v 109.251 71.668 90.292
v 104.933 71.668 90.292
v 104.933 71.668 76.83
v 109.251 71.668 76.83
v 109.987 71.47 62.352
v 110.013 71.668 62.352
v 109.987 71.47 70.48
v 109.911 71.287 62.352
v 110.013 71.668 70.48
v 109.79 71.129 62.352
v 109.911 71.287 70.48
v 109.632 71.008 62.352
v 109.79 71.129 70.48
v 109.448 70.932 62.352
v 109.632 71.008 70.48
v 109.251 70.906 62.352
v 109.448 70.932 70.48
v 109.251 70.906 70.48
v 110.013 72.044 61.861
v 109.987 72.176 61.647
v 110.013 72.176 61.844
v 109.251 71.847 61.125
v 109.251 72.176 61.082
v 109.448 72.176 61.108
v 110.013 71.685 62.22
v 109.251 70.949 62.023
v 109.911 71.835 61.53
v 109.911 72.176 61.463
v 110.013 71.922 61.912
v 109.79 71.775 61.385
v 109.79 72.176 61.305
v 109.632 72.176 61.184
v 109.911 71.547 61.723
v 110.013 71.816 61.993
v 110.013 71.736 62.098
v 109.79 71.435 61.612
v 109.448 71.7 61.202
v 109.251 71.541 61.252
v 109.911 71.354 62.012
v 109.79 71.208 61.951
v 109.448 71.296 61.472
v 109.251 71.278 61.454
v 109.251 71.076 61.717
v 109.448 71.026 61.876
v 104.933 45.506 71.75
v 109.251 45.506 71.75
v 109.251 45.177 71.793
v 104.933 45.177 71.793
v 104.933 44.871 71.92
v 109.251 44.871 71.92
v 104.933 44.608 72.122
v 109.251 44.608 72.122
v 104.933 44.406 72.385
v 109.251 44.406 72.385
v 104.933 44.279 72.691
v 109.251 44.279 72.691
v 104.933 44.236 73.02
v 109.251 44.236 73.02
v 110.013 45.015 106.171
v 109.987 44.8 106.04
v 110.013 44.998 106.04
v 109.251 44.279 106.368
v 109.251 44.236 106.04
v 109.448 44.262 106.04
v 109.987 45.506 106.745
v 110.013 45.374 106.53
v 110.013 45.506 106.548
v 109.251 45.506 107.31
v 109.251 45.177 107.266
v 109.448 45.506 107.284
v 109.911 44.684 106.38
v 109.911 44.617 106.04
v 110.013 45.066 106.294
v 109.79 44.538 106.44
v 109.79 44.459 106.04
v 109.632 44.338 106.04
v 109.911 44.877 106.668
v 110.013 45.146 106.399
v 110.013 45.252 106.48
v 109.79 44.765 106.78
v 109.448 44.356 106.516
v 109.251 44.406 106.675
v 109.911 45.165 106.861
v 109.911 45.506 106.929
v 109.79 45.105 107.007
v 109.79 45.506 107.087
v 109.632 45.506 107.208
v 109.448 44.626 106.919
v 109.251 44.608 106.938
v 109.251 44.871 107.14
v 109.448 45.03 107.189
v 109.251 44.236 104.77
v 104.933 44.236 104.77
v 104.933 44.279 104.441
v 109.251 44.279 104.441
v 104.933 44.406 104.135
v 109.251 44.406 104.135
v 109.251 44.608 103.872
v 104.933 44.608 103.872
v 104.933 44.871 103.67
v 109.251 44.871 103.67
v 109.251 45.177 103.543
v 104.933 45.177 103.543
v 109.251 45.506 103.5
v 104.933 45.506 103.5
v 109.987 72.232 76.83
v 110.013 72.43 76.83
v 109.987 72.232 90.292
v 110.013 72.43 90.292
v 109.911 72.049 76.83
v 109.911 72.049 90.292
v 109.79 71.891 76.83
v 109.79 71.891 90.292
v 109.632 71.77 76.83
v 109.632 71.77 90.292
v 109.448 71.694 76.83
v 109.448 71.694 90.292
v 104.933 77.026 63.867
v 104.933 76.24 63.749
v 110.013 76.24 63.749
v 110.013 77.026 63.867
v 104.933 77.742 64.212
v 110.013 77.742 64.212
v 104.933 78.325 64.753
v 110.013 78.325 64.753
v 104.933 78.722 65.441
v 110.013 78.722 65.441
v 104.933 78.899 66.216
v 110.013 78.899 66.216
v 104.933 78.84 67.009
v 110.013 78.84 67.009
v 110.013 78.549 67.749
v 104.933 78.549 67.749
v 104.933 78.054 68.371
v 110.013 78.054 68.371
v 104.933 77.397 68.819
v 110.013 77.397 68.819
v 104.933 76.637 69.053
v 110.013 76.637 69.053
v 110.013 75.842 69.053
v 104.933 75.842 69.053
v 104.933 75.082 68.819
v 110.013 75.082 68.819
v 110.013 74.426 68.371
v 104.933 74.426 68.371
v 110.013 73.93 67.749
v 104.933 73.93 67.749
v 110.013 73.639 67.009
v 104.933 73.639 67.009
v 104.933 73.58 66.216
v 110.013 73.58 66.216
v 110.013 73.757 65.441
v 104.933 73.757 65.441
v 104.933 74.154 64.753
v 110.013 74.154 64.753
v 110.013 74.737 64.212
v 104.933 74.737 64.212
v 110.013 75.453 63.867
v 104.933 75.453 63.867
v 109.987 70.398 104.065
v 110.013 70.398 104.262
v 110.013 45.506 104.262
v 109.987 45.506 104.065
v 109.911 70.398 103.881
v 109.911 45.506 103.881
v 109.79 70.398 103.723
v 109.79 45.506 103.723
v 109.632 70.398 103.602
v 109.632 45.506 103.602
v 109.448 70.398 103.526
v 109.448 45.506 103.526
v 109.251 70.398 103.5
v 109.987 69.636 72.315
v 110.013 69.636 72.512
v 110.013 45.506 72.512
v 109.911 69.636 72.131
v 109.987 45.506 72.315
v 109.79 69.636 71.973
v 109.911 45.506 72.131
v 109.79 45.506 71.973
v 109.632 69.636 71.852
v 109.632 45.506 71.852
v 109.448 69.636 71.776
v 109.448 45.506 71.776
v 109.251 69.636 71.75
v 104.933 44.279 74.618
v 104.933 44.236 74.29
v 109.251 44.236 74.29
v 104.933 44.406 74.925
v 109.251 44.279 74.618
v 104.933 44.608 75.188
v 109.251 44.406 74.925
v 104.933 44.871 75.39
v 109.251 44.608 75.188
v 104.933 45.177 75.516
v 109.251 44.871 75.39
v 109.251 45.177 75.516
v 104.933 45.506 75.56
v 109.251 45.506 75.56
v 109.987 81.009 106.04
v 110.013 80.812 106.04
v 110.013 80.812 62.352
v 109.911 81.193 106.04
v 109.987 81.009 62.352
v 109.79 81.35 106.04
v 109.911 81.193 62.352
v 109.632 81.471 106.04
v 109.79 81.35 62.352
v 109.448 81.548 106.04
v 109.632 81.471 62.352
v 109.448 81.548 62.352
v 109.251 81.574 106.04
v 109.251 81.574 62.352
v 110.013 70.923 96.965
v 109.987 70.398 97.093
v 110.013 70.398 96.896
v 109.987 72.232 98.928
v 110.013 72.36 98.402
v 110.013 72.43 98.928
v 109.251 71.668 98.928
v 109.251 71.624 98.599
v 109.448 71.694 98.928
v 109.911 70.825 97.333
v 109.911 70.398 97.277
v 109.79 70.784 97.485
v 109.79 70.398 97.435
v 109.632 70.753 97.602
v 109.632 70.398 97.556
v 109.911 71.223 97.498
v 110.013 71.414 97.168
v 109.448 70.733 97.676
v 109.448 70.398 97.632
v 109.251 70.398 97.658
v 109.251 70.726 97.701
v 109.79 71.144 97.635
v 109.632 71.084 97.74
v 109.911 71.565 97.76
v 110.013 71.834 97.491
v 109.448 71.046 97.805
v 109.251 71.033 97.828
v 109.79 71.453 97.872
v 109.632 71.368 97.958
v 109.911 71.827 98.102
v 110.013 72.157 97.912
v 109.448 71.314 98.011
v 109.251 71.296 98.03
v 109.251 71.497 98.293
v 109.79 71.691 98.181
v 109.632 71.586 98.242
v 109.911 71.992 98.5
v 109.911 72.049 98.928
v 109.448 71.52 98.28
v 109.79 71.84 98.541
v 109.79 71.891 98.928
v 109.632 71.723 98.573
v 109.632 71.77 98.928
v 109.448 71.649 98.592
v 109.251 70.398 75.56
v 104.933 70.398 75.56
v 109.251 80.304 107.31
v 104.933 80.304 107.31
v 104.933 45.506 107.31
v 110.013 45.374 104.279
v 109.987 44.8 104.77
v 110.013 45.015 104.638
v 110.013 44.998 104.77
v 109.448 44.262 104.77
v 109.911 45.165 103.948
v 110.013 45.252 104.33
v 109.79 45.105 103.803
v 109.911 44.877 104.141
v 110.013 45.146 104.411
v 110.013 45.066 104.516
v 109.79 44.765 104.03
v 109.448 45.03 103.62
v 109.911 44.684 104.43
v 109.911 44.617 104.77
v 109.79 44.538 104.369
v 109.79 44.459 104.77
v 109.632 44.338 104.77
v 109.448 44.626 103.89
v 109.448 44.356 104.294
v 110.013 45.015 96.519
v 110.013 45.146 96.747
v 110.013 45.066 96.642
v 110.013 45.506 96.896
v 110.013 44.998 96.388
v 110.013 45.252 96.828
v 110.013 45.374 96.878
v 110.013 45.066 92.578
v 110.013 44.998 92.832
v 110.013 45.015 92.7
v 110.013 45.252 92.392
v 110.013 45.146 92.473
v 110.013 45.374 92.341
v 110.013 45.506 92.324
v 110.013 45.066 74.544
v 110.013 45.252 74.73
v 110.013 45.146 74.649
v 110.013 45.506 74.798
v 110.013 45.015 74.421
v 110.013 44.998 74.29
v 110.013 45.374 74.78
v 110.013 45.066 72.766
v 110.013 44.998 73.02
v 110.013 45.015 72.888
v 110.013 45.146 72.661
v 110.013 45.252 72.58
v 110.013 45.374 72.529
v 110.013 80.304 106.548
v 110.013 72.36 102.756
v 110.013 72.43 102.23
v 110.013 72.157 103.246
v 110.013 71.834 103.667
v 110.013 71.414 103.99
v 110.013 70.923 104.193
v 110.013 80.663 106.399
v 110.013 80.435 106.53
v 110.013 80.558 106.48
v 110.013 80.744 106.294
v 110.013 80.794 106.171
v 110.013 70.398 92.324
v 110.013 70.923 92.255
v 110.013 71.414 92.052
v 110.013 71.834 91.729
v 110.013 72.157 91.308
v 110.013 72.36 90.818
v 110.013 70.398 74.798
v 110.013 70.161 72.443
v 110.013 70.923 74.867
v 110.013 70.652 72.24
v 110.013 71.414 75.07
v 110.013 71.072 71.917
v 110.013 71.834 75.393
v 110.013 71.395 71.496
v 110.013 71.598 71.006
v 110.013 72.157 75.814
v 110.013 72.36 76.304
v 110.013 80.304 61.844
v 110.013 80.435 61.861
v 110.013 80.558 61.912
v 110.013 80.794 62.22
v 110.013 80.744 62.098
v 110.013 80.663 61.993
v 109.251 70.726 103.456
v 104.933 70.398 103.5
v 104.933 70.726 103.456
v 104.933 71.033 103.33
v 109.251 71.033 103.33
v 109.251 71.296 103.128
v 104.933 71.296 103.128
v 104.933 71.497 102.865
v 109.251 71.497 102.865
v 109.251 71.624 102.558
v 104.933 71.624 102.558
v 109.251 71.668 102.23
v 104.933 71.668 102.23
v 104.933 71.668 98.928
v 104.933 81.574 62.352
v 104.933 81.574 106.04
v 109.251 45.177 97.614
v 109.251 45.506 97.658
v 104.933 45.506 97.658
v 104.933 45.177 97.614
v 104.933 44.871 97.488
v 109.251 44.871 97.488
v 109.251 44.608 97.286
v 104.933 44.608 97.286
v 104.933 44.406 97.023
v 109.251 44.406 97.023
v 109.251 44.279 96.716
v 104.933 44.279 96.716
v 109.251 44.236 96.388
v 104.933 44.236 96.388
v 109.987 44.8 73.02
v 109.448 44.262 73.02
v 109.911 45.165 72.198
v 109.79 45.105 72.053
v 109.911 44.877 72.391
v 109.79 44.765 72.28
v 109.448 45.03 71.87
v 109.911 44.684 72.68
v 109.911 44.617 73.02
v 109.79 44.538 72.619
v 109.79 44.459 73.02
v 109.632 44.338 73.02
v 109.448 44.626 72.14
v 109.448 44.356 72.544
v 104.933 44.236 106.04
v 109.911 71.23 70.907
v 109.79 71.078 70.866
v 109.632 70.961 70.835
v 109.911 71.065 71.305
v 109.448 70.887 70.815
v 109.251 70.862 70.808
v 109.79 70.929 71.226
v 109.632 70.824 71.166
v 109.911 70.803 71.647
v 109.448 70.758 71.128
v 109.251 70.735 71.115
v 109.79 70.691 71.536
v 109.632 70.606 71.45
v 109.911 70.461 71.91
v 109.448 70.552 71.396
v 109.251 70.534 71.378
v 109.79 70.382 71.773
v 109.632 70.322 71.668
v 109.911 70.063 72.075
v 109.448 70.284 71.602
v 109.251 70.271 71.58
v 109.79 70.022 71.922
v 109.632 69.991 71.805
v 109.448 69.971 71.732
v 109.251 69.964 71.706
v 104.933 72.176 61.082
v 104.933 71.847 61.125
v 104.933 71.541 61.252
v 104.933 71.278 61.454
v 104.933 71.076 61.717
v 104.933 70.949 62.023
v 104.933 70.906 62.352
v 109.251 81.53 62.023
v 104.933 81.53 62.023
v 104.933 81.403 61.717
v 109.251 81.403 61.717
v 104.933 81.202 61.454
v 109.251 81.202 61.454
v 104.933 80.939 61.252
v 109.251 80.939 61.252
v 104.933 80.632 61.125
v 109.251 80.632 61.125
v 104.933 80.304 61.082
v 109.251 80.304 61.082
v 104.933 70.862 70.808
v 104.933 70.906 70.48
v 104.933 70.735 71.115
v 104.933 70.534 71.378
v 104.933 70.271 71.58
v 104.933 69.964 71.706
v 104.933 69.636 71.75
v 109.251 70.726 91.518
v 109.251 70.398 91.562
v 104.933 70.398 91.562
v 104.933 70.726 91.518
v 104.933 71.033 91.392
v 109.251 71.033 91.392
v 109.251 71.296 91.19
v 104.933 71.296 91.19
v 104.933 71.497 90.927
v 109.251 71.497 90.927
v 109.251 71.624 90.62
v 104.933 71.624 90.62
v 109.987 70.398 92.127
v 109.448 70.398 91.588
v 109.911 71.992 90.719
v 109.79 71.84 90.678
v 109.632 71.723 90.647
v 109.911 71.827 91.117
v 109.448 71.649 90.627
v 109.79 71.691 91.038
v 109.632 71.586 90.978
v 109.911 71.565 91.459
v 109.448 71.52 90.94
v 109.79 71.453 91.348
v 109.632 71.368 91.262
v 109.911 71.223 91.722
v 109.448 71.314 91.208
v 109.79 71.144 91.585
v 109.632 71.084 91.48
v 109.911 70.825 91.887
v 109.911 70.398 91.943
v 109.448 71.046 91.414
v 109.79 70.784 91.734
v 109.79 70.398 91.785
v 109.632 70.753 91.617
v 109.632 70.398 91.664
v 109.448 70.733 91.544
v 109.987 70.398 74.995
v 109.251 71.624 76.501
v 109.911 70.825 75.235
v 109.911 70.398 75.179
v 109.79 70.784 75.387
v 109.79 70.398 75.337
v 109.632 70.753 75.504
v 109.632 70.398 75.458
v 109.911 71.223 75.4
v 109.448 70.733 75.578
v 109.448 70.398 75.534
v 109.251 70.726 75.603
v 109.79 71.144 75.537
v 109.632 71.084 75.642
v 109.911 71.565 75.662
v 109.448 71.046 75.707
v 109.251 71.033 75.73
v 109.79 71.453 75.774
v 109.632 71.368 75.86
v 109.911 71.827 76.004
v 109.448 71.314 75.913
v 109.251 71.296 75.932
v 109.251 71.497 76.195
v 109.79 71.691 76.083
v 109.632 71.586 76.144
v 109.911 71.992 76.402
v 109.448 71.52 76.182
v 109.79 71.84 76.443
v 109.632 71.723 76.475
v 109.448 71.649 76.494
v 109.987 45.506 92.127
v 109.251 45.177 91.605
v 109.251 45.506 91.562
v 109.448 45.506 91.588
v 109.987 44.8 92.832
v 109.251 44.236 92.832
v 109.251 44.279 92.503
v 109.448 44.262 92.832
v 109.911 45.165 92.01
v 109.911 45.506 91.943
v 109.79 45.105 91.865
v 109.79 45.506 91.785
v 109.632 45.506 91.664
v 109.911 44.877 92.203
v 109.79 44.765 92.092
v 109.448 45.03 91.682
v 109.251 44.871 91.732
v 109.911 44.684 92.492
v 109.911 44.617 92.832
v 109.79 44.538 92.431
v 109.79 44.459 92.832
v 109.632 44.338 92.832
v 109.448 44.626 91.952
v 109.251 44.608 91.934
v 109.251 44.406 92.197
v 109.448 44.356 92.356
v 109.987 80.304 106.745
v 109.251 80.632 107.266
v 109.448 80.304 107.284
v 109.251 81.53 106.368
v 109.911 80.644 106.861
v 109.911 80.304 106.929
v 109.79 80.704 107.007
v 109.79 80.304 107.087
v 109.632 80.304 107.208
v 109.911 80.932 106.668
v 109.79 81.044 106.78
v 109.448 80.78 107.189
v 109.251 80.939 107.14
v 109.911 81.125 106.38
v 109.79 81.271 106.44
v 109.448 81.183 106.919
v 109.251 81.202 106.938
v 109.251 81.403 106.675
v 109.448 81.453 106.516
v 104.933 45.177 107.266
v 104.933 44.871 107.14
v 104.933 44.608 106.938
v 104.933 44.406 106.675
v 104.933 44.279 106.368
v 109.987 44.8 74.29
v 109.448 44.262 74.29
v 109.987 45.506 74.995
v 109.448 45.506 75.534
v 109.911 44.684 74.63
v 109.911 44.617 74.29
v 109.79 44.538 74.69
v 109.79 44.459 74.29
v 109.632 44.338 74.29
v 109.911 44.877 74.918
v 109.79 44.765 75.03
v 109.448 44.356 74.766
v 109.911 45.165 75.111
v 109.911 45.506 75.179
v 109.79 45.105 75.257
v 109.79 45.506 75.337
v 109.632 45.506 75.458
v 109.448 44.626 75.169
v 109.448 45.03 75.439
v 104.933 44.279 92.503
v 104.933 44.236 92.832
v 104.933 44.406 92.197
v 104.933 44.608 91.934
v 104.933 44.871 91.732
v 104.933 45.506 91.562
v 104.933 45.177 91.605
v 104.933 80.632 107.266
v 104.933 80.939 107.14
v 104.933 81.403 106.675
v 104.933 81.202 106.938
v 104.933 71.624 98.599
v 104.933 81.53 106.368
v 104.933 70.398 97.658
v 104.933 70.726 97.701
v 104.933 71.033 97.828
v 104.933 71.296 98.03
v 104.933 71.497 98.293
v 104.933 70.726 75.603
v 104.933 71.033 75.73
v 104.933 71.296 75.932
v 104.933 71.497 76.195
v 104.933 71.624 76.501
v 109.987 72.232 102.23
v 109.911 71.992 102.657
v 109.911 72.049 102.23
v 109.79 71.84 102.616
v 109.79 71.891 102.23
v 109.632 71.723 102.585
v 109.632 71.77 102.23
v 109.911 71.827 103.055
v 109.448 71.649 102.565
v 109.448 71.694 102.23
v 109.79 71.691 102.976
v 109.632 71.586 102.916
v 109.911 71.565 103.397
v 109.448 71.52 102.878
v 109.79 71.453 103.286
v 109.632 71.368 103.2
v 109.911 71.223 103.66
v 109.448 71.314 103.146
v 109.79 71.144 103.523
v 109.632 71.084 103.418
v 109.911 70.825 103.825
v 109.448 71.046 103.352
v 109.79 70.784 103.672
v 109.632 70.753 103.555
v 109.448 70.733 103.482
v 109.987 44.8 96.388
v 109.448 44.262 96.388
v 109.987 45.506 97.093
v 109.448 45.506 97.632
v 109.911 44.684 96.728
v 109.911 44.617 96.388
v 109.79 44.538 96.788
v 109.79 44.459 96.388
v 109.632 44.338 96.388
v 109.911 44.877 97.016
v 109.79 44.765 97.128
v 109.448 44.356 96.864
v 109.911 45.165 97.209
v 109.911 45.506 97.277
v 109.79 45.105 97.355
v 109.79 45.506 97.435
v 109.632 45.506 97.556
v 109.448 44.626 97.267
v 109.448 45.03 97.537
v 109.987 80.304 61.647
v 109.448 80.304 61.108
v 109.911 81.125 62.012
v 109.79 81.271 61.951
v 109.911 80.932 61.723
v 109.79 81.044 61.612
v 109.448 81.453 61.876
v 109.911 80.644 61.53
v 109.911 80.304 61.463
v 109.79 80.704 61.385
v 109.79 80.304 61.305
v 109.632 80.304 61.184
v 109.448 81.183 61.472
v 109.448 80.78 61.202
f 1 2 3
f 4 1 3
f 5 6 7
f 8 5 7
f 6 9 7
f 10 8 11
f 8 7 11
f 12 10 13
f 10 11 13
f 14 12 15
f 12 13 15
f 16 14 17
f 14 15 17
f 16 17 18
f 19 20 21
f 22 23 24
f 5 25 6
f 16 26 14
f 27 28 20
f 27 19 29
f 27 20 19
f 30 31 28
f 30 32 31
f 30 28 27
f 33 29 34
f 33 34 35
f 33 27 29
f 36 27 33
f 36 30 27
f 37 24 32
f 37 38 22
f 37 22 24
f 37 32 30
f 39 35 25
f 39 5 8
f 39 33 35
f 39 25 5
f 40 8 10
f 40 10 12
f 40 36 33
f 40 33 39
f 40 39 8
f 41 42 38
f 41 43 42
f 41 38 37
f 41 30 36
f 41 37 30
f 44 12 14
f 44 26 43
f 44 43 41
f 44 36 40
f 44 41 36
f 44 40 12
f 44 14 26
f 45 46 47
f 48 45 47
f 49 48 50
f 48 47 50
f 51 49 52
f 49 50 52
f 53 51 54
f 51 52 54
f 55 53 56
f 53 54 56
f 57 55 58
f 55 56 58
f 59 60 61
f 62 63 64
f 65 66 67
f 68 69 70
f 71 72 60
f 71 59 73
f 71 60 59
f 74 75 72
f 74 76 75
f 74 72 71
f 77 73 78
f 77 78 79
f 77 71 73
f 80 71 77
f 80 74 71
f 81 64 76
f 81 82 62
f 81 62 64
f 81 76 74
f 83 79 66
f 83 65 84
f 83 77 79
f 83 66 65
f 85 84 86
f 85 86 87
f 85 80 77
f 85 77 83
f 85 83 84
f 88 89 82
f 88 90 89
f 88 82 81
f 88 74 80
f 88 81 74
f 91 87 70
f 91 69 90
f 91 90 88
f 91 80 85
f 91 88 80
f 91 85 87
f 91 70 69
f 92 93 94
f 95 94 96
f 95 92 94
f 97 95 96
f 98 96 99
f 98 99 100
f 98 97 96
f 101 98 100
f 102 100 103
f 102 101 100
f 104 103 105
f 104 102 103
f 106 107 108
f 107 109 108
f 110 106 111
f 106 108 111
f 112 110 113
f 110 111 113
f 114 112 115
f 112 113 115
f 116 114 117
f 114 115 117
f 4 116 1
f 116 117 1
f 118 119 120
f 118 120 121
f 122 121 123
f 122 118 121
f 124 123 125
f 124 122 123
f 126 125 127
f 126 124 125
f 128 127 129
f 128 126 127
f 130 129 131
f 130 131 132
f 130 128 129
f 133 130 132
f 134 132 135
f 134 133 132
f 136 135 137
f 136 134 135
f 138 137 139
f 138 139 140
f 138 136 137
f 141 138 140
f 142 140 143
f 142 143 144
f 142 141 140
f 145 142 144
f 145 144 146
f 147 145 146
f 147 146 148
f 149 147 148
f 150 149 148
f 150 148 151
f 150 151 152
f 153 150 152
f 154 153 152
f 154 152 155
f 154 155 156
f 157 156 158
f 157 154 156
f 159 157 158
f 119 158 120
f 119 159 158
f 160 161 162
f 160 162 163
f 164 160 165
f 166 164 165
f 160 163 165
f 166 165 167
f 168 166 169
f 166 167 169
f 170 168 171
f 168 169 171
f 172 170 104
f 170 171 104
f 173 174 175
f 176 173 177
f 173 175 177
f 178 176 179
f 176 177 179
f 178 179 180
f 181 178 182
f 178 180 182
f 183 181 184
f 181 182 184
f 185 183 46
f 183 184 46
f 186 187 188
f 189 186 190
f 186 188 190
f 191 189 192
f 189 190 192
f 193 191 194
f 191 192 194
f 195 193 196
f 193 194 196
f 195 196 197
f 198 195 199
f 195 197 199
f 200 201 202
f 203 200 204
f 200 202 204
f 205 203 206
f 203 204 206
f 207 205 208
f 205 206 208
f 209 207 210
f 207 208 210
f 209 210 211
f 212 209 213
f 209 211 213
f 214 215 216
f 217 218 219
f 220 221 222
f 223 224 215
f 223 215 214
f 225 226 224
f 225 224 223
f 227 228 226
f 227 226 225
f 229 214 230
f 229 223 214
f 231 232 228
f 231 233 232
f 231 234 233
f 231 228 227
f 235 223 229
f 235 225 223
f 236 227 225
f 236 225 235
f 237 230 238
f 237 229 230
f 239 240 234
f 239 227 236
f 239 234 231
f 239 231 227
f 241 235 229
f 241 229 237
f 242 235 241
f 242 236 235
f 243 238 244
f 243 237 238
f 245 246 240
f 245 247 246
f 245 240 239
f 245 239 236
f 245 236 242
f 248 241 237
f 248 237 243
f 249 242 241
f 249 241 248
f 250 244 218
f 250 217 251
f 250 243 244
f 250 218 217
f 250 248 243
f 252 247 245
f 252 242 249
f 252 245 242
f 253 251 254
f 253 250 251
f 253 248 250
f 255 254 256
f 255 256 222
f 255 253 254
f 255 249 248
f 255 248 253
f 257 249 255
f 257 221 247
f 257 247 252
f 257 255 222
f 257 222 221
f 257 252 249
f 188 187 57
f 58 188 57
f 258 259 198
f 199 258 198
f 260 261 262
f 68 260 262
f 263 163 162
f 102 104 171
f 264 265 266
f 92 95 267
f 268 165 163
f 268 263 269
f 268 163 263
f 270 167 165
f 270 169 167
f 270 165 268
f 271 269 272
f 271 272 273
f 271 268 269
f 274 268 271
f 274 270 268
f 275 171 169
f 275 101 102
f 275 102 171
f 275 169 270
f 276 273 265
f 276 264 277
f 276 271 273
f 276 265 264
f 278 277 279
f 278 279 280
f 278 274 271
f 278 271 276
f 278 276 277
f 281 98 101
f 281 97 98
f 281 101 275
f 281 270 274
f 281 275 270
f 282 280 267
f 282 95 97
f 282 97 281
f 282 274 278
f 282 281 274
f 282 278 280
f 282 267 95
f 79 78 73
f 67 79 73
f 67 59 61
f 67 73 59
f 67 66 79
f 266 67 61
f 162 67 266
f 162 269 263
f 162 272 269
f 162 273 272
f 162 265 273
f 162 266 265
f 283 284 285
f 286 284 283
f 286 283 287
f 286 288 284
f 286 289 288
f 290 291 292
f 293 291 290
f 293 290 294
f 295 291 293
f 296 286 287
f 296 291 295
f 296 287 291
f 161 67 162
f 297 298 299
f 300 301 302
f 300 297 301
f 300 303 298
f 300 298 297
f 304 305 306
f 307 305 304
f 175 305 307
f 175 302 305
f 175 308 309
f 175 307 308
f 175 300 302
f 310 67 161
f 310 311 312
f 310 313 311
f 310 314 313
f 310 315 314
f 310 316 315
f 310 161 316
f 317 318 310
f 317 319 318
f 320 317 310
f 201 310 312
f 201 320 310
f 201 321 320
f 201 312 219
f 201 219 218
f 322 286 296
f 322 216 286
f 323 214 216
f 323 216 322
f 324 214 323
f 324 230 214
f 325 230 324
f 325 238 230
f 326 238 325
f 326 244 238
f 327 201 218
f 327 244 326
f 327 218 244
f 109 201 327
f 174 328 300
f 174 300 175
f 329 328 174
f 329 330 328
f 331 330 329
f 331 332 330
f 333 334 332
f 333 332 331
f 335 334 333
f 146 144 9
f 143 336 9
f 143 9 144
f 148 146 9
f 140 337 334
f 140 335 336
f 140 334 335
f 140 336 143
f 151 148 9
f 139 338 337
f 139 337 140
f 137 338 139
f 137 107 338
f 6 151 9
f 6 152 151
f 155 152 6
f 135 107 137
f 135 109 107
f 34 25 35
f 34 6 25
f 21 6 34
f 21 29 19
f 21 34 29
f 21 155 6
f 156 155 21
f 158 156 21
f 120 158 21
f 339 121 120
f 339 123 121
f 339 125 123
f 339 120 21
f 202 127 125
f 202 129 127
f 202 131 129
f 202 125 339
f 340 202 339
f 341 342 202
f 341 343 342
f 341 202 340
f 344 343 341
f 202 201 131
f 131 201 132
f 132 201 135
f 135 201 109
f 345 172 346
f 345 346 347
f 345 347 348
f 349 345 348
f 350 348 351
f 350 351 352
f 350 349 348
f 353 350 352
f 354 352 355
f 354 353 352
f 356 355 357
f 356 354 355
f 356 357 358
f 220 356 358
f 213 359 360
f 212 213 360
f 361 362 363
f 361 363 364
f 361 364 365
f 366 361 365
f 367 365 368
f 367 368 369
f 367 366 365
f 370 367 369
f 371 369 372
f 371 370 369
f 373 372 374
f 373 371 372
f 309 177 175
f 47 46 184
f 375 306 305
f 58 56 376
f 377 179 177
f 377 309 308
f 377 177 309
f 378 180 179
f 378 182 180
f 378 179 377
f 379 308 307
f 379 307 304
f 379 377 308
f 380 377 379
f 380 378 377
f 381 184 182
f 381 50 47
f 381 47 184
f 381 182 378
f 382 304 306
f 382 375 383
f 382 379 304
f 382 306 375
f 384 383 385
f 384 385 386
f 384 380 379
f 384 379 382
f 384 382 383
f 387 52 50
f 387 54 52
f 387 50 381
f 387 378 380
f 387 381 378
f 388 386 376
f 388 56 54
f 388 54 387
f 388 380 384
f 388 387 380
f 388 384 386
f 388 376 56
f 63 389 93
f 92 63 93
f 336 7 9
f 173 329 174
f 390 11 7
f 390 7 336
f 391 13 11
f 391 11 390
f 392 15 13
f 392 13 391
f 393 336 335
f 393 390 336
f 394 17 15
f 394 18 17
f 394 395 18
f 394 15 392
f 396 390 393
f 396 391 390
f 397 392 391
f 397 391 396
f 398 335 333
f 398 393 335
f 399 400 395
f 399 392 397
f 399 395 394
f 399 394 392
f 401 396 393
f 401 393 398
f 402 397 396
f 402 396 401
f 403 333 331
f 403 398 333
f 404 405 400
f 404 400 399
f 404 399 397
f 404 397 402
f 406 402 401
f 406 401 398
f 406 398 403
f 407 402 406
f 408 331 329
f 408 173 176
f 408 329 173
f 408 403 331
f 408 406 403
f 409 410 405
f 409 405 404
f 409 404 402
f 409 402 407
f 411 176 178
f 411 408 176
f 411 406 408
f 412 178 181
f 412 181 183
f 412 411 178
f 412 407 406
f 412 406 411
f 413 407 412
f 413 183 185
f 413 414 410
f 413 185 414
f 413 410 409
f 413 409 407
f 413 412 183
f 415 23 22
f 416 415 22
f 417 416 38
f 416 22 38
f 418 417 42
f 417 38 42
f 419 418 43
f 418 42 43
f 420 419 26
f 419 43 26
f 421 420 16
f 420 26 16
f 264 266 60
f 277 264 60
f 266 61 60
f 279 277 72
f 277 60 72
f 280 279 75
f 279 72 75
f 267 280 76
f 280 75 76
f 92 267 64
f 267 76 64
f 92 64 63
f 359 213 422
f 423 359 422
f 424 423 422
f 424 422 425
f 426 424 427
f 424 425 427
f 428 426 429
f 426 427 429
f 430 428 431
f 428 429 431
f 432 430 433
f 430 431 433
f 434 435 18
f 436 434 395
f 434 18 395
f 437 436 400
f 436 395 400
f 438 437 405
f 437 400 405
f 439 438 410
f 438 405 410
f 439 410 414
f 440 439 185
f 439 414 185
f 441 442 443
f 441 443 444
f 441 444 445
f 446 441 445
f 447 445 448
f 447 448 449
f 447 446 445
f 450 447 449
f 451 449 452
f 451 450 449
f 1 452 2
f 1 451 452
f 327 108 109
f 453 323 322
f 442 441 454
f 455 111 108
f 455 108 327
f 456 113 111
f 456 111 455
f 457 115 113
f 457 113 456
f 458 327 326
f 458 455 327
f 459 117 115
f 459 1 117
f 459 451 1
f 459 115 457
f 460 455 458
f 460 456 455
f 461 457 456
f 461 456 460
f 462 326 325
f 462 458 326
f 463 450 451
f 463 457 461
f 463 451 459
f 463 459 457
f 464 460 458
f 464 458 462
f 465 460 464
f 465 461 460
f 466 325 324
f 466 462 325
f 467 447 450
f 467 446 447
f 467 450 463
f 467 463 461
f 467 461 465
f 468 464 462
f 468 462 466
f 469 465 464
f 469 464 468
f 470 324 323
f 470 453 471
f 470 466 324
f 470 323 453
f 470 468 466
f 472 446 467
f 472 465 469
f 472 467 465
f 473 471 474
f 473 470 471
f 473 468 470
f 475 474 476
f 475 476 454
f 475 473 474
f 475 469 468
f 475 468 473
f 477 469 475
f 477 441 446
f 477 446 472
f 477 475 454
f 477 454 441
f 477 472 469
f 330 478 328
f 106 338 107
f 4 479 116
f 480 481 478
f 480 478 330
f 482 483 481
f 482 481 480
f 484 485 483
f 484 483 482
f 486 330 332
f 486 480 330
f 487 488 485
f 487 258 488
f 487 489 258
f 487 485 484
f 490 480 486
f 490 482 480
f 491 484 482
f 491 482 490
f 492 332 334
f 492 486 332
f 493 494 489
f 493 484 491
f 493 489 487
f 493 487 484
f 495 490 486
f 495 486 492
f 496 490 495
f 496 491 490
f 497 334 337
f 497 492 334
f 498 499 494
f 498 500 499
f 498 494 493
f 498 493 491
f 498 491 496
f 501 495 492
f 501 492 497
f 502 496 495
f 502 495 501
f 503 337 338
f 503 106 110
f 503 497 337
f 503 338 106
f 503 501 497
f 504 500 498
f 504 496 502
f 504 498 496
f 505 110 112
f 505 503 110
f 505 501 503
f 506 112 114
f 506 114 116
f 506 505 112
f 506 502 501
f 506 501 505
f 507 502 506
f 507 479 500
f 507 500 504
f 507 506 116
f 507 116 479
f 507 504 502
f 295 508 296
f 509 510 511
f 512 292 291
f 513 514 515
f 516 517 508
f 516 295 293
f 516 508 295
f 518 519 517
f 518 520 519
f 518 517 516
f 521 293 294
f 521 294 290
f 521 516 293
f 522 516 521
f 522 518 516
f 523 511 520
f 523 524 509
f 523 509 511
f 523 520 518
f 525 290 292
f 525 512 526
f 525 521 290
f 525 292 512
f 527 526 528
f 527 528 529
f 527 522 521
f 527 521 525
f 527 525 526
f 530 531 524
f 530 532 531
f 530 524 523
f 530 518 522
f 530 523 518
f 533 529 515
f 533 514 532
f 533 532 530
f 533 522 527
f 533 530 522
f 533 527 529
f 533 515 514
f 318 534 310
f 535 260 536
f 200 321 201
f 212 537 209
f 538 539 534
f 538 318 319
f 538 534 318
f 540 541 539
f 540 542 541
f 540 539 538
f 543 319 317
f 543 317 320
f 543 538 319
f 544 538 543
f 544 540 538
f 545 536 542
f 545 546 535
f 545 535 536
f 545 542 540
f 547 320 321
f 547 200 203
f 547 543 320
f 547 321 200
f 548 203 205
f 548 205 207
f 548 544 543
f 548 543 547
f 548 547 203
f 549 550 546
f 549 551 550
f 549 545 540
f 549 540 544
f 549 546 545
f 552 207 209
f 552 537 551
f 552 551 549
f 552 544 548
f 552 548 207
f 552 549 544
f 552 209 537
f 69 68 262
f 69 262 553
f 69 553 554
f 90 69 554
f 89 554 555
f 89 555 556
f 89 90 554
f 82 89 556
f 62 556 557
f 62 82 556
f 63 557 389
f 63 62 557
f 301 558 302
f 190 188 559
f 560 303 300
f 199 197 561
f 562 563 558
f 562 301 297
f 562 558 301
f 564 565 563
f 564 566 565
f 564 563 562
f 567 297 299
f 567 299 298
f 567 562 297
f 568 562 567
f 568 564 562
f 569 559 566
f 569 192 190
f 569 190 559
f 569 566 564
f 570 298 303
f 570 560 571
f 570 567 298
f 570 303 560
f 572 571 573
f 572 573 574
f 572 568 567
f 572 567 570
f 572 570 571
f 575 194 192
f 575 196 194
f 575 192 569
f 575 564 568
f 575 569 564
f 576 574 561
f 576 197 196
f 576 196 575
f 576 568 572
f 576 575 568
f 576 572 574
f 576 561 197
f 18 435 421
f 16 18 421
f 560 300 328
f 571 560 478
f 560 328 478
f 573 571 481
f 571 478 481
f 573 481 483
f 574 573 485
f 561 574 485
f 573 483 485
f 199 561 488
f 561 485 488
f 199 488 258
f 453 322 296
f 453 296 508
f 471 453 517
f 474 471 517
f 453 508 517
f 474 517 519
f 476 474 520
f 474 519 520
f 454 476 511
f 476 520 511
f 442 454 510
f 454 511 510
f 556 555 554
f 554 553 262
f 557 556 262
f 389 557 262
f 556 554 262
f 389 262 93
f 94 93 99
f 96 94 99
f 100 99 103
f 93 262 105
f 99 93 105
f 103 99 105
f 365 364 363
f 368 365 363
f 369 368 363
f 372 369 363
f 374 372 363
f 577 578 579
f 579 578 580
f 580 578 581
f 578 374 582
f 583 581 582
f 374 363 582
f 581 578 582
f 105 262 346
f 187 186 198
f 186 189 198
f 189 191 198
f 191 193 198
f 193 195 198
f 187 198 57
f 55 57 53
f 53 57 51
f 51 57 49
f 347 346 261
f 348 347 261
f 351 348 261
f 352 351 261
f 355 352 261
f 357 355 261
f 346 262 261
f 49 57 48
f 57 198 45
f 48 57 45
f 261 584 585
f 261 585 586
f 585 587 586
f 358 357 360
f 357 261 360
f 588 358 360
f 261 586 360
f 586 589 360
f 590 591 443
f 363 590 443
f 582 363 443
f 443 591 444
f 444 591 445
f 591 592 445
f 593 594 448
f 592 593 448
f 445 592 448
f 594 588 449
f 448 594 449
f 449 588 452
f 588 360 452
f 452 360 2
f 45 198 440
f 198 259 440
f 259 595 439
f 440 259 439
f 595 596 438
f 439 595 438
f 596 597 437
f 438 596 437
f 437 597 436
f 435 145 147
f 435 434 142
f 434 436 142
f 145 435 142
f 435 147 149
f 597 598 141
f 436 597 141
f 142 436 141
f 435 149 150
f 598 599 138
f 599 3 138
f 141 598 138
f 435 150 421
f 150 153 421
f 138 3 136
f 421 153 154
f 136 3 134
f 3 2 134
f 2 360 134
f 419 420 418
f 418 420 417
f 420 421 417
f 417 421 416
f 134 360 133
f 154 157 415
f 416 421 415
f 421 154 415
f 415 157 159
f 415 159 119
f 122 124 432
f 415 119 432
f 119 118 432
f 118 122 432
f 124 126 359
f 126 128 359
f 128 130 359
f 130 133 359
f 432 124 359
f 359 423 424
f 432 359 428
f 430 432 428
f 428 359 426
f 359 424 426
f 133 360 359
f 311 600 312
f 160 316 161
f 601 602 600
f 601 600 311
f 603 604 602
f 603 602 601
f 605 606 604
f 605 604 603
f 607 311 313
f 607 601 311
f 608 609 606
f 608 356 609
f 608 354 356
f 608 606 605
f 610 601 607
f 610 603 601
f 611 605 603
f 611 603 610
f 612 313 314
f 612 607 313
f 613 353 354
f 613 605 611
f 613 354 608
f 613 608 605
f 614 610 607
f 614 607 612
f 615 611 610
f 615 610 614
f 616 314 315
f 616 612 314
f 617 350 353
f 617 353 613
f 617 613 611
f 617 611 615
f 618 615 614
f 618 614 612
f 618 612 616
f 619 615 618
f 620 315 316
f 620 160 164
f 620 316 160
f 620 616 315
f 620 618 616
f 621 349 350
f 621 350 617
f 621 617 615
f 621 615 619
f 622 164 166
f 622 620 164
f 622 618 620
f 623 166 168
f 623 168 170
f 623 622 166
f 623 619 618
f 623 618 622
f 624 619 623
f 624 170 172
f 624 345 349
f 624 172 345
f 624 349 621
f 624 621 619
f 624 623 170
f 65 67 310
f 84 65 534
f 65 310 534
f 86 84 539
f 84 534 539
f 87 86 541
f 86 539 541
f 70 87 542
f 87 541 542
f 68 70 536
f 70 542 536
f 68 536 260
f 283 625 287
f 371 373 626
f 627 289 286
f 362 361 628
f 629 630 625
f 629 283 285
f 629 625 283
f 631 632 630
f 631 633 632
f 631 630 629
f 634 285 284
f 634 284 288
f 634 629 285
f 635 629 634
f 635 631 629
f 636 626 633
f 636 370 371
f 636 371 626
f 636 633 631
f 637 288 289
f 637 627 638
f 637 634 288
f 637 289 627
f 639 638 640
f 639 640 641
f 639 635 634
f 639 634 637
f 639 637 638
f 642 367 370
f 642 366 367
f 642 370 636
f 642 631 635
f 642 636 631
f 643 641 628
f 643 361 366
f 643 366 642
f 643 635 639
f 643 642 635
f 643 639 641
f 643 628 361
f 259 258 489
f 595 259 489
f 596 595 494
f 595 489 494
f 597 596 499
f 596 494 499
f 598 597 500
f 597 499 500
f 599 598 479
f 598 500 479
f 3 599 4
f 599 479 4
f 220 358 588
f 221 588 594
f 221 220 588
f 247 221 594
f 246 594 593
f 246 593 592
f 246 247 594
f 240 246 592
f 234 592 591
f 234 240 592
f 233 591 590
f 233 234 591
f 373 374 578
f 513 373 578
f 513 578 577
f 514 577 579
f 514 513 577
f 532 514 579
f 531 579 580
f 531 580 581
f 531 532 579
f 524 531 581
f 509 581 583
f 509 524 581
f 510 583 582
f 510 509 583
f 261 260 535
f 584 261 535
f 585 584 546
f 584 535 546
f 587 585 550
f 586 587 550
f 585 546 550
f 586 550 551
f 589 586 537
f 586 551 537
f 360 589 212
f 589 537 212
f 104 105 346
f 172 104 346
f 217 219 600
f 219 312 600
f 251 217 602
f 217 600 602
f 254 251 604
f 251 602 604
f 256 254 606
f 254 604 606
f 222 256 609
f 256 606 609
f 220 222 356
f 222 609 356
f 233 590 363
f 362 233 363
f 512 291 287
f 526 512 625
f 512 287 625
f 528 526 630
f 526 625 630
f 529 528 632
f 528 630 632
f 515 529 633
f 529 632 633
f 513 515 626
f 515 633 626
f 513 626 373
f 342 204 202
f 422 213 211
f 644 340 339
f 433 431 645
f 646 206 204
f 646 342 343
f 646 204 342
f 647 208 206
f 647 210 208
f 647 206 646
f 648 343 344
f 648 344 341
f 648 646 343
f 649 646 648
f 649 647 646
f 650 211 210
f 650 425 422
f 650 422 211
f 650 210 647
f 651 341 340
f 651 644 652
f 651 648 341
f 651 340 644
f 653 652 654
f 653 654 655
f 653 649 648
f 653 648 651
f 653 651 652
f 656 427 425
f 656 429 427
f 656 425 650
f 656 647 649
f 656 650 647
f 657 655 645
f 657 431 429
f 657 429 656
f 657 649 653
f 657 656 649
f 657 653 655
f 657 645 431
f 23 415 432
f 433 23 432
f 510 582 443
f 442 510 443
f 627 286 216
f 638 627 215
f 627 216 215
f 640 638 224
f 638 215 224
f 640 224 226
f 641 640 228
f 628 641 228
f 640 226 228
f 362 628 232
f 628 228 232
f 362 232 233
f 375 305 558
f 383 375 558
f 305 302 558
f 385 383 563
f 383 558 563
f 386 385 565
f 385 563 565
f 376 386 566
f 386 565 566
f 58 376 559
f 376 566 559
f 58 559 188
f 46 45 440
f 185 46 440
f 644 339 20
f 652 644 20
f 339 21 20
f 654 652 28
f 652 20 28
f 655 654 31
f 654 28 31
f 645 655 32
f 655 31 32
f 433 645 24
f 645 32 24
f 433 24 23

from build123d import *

# Parameters (mm, degrees)
SKETCH2_R           = 2.667
BOSS_EXTRUDE1_DEPTH = 5.08
FILLET1_R           = 1.27
FILLET2_R           = 0.762


with BuildPart() as part:
    # Sketch2 → Boss-Extrude1 (new body)
    with BuildSketch(Plane(origin=(104.932978861, 0, 0), x_dir=(0, 0, -1), z_dir=(1, 0, 0))):
        Polygon((-107.309772969, 81.573572085), (-107.309772969, 65.825572085), (-107.309772969, 60.745572085), (-107.309772969, 44.235572085), (-103.499772969, 44.235572085), (-103.499772969, 46.775572085), (-103.499772969, 71.667572085), (-97.657772969, 71.667572085), (-97.657772969, 46.775572085), (-97.657772969, 44.235572085), (-91.561772969, 44.235572085), (-91.561772969, 46.775572085), (-91.561772969, 71.667572085), (-75.559772969, 71.667572085), (-75.559772969, 46.775572085), (-75.559772969, 44.235572085), (-71.749772969, 44.235572085), (-71.749772969, 70.905572085), (-61.081772969, 70.905572085), (-61.081772969, 81.573572085), align=None)
        with Locations((-66.415772969, 76.239572085)):
            Circle(SKETCH2_R, mode=Mode.SUBTRACT)
    extrude(amount=BOSS_EXTRUDE1_DEPTH)

    # Fillet1
    fillet1_edges = [part.edges().sort_by_distance(p)[0] for p in [
        (107.472978861, 81.573572085, 61.081772969),
        (107.472978861, 70.905572085, 61.081772969),
        (107.472978861, 70.905572085, 71.749772969),
        (107.472978861, 44.235572085, 71.749772969),
        (107.472978861, 44.235572085, 75.559772969),
        (107.472978861, 71.667572085, 75.559772969),
        (107.472978861, 71.667572085, 91.561772969),
        (107.472978861, 44.235572085, 91.561772969),
        (107.472978861, 44.235572085, 97.657772969),
        (107.472978861, 71.667572085, 97.657772969),
        (107.472978861, 71.667572085, 103.499772969),
        (107.472978861, 44.235572085, 103.499772969),
        (107.472978861, 44.235572085, 107.309772969),
        (107.472978861, 81.573572085, 107.309772969),
    ]]
    fillet(fillet1_edges, radius=FILLET1_R)

    # Fillet2
    fillet2_edges = [part.edges().sort_by_distance(p)[0] for p in [
        (110.012978861, 70.533597697, 71.377798581),
        (110.012978861, 57.570572085, 71.749772969),
        (110.012978861, 44.607546473, 72.121747356),
        (110.012978861, 44.235572085, 73.654772969),
        (110.012978861, 44.607546473, 75.187798581),
        (110.012978861, 57.951572085, 75.559772969),
        (110.012978861, 71.295597697, 75.931747356),
        (110.012978861, 71.667572085, 83.560772969),
        (110.012978861, 71.295597697, 91.189798581),
        (110.012978861, 57.951572085, 91.561772969),
        (110.012978861, 44.607546473, 91.933747356),
        (110.012978861, 44.235572085, 94.609772969),
        (110.012978861, 44.607546473, 97.285798581),
        (110.012978861, 57.951572085, 97.657772969),
        (110.012978861, 71.295597697, 98.029747356),
        (110.012978861, 71.667572085, 100.578772969),
        (110.012978861, 71.295597697, 103.127798581),
        (110.012978861, 57.951572085, 103.499772969),
        (110.012978861, 44.607546473, 103.871747356),
        (110.012978861, 44.235572085, 105.404772969),
        (110.012978861, 44.607546473, 106.937798581),
        (110.012978861, 62.904572085, 107.309772969),
        (110.012978861, 81.201597697, 106.937798581),
        (110.012978861, 81.573572085, 84.195772969),
        (110.012978861, 81.201597697, 61.453747356),
        (110.012978861, 76.239572085, 61.081772969),
        (110.012978861, 71.277546473, 61.453747356),
        (110.012978861, 70.905572085, 66.415772969),
    ]]
    fillet(fillet2_edges, radius=FILLET2_R)


solid = part.part
